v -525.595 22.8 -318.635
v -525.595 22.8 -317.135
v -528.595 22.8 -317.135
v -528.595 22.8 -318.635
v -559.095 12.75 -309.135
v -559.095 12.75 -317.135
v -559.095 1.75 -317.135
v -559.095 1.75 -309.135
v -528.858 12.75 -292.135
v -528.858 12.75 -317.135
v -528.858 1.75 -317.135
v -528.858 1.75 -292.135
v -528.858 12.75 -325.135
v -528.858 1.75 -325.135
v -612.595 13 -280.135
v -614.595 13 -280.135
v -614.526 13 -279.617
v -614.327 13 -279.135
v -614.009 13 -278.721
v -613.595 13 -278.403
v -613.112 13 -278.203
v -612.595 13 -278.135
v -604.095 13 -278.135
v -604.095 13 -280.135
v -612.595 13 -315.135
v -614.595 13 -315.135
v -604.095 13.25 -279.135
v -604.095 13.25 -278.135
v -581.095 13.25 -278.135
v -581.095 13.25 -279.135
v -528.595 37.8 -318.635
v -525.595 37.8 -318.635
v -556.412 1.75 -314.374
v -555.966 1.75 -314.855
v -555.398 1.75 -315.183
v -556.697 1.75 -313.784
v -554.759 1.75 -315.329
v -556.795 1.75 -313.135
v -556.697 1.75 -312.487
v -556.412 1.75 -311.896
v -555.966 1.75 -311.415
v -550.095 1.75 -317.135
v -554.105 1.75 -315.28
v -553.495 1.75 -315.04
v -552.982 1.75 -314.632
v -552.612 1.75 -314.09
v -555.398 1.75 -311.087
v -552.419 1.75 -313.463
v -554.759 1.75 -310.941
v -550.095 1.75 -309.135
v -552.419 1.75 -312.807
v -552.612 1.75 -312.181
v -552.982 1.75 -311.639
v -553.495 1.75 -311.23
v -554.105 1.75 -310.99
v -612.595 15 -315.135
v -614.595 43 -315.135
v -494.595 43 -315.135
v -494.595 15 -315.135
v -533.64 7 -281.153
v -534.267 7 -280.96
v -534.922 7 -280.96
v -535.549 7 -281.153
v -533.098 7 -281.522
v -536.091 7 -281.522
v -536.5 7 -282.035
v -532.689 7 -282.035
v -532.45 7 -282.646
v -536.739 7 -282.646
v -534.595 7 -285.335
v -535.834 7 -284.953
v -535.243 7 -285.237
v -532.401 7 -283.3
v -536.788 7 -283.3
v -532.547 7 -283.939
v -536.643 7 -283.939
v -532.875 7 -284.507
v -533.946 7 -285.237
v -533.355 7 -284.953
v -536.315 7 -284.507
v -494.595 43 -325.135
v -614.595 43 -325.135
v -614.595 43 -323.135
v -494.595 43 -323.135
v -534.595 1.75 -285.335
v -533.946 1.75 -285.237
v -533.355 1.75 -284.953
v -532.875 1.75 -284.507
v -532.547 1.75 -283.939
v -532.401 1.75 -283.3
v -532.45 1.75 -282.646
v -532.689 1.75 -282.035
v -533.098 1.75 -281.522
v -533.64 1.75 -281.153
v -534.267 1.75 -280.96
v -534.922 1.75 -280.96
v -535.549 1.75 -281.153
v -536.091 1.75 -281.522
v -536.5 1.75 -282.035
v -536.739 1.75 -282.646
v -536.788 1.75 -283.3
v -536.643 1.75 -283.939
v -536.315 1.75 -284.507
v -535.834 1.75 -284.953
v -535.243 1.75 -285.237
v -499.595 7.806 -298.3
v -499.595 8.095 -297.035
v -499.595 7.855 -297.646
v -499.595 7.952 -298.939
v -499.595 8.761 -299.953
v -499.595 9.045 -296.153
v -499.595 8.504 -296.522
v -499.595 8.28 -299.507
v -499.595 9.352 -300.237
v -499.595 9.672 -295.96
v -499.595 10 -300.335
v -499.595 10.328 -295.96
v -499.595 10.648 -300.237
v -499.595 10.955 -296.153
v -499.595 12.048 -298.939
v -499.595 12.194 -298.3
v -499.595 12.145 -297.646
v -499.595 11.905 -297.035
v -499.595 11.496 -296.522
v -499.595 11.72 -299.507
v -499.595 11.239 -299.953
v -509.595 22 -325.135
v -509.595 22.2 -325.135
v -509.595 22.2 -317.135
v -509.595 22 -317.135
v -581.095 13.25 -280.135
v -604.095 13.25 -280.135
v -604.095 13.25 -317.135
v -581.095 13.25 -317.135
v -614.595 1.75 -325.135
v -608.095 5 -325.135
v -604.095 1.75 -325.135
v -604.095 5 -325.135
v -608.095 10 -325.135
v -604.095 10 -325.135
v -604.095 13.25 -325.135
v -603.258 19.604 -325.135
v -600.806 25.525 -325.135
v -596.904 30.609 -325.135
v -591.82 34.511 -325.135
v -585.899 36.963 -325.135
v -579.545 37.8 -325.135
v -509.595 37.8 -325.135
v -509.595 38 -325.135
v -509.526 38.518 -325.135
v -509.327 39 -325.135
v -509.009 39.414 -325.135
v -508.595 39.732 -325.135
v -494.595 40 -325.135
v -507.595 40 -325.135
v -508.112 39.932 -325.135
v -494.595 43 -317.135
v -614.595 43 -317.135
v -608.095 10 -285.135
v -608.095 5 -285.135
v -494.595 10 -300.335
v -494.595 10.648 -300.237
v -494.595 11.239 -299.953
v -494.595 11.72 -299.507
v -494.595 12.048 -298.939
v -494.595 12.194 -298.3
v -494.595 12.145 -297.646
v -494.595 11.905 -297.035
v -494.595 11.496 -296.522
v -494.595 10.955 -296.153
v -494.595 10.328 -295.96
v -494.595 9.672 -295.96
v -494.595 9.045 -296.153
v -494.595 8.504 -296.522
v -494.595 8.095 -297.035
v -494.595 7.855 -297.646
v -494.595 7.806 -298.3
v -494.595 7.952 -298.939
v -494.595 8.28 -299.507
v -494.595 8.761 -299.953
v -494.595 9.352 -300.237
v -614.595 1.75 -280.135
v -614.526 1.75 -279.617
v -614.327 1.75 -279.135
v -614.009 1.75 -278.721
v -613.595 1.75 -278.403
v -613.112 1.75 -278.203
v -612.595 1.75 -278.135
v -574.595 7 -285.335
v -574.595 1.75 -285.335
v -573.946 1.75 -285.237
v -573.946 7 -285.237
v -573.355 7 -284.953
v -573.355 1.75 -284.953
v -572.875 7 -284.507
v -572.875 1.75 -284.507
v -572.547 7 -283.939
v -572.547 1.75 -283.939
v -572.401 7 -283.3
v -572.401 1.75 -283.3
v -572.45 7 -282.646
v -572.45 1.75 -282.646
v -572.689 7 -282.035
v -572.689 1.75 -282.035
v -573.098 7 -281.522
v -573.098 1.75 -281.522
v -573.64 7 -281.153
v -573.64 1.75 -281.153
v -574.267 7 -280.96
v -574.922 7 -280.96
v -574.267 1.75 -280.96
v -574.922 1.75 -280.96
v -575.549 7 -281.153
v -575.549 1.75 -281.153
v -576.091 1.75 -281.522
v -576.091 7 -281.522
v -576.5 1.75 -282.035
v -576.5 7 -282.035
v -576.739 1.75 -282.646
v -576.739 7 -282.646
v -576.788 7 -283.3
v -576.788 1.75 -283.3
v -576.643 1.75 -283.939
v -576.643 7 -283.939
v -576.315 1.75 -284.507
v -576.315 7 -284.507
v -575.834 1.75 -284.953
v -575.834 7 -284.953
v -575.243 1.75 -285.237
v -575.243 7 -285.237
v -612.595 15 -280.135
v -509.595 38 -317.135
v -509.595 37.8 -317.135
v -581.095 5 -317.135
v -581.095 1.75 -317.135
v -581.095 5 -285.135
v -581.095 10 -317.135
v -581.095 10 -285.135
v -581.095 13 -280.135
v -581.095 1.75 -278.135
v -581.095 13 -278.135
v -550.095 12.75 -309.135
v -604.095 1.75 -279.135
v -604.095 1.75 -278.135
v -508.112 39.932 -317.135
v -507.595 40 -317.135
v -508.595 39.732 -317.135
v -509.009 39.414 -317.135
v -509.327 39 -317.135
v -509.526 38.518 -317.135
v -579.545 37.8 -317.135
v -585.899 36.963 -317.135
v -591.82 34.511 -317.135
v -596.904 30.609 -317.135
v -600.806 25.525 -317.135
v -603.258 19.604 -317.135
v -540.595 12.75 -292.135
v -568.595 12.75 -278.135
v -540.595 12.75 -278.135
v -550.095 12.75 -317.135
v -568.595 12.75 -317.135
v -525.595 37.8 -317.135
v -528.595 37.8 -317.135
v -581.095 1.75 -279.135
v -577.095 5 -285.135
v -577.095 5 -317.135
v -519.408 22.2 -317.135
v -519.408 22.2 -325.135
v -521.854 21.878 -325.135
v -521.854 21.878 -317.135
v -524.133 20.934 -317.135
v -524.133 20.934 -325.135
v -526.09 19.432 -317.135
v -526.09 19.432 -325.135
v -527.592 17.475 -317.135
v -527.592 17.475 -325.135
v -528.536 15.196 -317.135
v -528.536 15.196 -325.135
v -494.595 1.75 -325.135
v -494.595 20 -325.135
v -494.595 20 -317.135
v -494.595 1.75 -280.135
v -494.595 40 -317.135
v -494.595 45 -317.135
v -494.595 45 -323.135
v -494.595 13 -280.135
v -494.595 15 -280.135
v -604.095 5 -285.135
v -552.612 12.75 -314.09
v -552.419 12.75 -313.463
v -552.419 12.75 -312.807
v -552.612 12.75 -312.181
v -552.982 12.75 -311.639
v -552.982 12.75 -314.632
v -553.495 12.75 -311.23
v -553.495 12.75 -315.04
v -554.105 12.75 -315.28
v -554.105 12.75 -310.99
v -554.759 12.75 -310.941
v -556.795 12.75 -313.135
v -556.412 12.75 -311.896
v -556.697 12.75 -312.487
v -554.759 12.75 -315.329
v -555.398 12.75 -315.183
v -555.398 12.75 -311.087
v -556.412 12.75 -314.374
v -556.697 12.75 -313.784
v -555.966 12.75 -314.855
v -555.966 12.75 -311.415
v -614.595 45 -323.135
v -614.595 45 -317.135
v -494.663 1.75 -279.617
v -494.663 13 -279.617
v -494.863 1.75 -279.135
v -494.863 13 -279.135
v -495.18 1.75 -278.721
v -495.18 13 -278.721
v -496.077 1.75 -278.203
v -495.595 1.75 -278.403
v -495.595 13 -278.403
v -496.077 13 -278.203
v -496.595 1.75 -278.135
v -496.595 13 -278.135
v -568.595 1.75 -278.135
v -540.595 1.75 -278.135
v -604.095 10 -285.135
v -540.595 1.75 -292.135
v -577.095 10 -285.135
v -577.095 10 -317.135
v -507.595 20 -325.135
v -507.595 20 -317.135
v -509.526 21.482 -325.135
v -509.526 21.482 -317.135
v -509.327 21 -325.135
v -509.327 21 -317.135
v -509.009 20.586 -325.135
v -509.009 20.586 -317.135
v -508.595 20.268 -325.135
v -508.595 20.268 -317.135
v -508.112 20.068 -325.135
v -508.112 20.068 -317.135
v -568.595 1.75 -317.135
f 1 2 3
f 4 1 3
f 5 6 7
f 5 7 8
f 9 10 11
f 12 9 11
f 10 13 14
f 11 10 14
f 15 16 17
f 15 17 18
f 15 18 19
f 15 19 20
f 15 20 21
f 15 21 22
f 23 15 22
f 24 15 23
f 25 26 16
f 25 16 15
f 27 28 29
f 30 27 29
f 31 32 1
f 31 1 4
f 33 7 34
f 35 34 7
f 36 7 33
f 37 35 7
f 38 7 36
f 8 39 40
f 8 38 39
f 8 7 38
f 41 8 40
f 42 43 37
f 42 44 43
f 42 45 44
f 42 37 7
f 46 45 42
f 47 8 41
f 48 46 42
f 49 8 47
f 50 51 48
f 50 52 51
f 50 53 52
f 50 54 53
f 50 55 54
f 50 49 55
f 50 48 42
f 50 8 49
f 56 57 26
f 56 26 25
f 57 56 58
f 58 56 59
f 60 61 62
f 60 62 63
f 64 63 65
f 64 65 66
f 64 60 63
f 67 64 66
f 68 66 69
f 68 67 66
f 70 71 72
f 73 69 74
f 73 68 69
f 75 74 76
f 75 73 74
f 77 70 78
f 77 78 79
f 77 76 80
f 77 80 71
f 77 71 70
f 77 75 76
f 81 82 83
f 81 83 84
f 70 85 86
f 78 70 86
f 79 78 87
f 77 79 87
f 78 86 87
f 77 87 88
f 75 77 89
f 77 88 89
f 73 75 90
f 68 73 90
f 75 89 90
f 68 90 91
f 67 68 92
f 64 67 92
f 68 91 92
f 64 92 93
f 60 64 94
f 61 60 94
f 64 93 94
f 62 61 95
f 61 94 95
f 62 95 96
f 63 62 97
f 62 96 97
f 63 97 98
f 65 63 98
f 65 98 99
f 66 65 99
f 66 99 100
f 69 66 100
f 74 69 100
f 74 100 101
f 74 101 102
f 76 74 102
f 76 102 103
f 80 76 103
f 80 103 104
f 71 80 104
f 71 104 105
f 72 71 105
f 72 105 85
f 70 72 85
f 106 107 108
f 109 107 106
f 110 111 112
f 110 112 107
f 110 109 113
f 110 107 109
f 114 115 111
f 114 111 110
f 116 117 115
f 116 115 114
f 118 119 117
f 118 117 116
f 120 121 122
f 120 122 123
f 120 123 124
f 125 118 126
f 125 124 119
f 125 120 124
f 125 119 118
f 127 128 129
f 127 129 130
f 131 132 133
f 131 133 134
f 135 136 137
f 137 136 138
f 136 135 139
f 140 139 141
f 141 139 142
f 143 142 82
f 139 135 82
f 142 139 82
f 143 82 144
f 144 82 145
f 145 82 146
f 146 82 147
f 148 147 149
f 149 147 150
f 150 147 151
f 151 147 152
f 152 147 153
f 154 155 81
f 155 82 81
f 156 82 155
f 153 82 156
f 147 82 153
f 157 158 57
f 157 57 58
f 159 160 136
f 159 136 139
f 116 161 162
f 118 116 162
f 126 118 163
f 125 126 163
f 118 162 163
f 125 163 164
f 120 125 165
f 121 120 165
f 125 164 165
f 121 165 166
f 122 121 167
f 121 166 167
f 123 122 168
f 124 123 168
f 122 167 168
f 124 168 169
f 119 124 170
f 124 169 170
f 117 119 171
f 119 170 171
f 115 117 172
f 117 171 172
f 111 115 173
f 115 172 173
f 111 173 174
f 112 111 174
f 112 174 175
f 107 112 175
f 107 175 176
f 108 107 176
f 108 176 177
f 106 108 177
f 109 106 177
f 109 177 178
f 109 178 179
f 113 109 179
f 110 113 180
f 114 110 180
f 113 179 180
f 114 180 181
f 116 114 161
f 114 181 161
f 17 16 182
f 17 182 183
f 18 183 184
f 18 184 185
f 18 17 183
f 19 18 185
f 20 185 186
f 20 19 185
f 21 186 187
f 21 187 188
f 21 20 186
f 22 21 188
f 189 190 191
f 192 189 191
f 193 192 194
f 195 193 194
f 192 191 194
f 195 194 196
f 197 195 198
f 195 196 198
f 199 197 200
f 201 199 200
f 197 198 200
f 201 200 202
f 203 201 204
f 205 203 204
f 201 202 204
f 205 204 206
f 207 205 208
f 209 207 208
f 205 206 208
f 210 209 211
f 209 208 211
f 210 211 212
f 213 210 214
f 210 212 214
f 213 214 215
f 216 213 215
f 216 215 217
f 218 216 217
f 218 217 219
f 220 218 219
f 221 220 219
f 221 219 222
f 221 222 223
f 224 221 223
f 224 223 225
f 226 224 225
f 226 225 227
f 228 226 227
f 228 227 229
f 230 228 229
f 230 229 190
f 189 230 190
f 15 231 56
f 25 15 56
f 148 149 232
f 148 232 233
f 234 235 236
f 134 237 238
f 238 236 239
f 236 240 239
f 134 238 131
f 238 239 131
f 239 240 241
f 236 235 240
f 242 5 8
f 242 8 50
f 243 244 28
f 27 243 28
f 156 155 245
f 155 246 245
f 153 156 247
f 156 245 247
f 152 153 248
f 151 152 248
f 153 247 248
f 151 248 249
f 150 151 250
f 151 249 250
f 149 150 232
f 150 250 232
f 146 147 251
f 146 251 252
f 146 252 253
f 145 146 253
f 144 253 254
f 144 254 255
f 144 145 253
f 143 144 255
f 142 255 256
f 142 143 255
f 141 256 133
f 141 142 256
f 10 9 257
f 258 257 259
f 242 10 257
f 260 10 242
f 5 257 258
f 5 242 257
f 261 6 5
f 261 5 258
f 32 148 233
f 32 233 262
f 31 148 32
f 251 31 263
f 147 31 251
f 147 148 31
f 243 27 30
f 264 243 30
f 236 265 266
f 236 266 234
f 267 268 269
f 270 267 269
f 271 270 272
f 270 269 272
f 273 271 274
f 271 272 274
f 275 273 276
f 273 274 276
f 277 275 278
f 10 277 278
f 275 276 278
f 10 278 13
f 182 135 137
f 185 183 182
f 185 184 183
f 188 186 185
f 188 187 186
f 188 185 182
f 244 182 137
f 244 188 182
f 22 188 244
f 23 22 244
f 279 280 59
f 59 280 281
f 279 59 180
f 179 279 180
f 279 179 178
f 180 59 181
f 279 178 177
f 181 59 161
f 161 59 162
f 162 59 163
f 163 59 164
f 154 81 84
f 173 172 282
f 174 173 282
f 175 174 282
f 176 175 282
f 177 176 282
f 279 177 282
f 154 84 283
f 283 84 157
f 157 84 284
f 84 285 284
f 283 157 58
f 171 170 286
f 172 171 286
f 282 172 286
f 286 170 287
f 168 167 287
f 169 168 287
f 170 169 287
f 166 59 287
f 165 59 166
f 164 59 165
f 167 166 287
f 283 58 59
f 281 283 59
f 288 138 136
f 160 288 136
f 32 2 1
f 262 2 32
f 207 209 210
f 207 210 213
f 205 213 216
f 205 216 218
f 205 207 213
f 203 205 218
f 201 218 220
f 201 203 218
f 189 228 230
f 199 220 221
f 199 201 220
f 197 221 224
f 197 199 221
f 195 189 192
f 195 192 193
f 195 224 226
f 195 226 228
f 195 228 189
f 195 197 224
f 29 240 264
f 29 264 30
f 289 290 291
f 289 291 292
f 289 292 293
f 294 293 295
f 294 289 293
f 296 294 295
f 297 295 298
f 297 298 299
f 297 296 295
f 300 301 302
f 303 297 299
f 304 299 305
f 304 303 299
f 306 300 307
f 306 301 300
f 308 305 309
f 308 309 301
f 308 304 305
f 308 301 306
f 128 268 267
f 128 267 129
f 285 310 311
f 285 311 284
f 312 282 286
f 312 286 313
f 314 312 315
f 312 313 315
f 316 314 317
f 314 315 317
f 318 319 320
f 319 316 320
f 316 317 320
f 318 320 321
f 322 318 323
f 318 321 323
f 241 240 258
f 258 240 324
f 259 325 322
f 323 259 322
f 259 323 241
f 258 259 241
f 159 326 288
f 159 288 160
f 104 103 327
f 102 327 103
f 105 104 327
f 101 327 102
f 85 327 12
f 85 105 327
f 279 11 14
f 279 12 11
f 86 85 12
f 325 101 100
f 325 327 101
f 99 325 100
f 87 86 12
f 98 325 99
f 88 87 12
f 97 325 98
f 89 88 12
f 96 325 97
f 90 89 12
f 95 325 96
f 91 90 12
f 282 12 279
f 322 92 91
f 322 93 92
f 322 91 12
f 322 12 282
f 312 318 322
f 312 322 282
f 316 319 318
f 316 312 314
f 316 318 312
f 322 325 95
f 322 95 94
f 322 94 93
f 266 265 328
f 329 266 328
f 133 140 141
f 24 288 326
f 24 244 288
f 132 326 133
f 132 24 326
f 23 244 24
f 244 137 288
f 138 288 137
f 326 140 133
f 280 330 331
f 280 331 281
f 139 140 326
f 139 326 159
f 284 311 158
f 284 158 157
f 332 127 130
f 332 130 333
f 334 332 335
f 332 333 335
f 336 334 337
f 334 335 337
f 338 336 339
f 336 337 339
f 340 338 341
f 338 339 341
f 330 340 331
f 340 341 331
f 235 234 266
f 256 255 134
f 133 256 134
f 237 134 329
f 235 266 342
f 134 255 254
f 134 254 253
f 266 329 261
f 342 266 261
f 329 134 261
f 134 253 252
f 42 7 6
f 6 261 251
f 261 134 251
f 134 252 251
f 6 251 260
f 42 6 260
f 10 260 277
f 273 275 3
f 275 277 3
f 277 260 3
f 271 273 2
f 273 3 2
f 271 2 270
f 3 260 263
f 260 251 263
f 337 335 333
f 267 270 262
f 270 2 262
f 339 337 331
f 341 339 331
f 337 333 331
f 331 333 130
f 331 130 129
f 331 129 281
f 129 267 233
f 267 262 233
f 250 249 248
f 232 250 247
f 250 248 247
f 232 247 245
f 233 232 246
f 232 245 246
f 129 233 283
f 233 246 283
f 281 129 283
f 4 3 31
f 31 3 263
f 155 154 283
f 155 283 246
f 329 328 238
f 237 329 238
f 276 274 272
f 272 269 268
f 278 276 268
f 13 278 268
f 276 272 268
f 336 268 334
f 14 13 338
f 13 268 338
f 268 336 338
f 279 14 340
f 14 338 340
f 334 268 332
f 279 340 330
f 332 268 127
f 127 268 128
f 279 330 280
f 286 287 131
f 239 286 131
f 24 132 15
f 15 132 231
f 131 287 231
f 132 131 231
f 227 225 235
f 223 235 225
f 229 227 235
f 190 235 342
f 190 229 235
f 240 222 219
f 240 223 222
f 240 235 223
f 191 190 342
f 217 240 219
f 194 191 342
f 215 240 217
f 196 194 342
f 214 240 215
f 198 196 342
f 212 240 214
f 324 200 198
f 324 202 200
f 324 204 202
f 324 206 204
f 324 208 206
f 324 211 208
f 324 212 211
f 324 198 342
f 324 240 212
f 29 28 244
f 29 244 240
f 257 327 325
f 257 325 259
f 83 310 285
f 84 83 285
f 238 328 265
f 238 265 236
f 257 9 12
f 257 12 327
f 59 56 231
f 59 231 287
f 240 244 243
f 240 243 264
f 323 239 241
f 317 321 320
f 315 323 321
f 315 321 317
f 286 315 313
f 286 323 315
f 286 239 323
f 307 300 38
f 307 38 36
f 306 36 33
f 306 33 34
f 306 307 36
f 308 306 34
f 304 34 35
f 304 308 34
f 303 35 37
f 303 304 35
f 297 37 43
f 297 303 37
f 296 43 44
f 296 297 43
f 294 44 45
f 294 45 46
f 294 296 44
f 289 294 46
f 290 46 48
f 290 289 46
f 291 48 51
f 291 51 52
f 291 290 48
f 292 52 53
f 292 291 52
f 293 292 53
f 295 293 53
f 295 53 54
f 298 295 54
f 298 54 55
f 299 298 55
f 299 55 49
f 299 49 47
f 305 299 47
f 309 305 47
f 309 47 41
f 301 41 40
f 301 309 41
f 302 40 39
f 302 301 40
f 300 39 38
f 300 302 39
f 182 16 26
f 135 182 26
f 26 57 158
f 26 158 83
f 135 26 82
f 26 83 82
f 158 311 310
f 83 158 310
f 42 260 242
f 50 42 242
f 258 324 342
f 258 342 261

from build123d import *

# Parameters (mm, degrees)
SKETCH_1_W           = 120
SKETCH_1_H           = 47
EXTRUDE_1_DEPTH      = 15
SKETCH_2_W           = 120
SKETCH_2_H           = 10
EXTRUDE_2_DEPTH      = 30
SKETCH_3_W           = 28
SKETCH_3_H           = 10.5
CUT_EXTRUDE_1_DEPTH  = 619.029542744
SKETCH_4_W           = 23
SKETCH_4_H           = 11.5
CUT_EXTRUDE_2_DEPTH  = 619.029542744
SKETCH_5_W           = 23
SKETCH_5_H           = 11.5
EXTRUDE_3_DEPTH      = 1
CUT_EXTRUDE_4_DEPTH  = 8
SKETCH_8_W           = 4
SKETCH_8_H           = 5
CUT_EXTRUDE_5_DEPTH  = 40
EXTRUDE_5_DEPTH      = 3
FILLET_2_R           = 2
EXTRUDE_6_DEPTH      = 2
SKETCH_12_W          = 120
SKETCH_12_H          = 2
CUT_EXTRUDE_7_DEPTH  = 2
SKETCH_15_R          = 2.2
CUT_EXTRUDE_9_DEPTH  = 7
SKETCH_18_W          = 63.5
SKETCH_18_H          = 11
CUT_EXTRUDE_15_DEPTH = 8
SKETCH_20_W          = 28
SKETCH_20_H          = 0.5
CUT_EXTRUDE_16_DEPTH = 80
CUT_EXTRUDE_17_DEPTH = 8
SKETCH_22_W          = 11.736843269
SKETCH_22_H          = 11
CUT_EXTRUDE_18_DEPTH = 25
SKETCH_24_W          = 120
SKETCH_24_H          = 4
CUT_EXTRUDE_19_DEPTH = 2
SKETCH_25_W          = 23.28525444
SKETCH_25_H          = 36.187442056
CUT_EXTRUDE_20_DEPTH = 2
SKETCH_27_W          = 120.611710339
SKETCH_27_H          = 50.488927659
CUT_EXTRUDE_24_DEPTH = 1.75
SKETCH_28_W          = 3
SKETCH_28_H          = 15
EXTRUDE_7_DEPTH      = 1.5
CUT_EXTRUDE_25_DEPTH = 2
SKETCH_30_W          = 9
SKETCH_30_H          = 8
SKETCH_30_R          = 2.2
EXTRUDE_8_DEPTH      = 11
SKETCH_33_R          = 2.2
CUT_EXTRUDE_27_DEPTH = 5


with BuildPart() as part:
    # 草图1 → 凸台-拉伸1 (new body)
    with BuildSketch(Plane(origin=(0, 0, 0), x_dir=(1, 0, 0), z_dir=(0, 1, 0))):
        with Locations((-554.594594595, 301.635135135)):
            Rectangle(SKETCH_1_W, SKETCH_1_H)
    extrude(amount=EXTRUDE_1_DEPTH)

    # 草图2 → 凸台-拉伸2 (add)
    with BuildSketch(Plane(origin=(0, 15, 0), x_dir=(1, 0, 0), z_dir=(0, 1, 0))):
        with Locations((-554.594594595, 320.135135135)):
            Rectangle(SKETCH_2_W, SKETCH_2_H)
    extrude(amount=EXTRUDE_2_DEPTH)

    # 草图3 → 切除-拉伸1 (cut, through all)
    with BuildSketch(Plane.XY.offset(-278.135135135)):
        with Locations((-554.594594595, 7.5)):
            Rectangle(SKETCH_3_W, SKETCH_3_H)
    extrude(amount=-CUT_EXTRUDE_1_DEPTH, mode=Mode.SUBTRACT)

    # 草图4 → 切除-拉伸2 (cut, through all)
    with BuildSketch(Plane.XY.offset(-278.135135135)):
        with Locations((-592.594594595, 7.5)):
            Rectangle(SKETCH_4_W, SKETCH_4_H)
    extrude(amount=-CUT_EXTRUDE_2_DEPTH, mode=Mode.SUBTRACT)

    # 草图7 → 切除-拉伸4 (cut)
    with BuildSketch(Plane(origin=(0, 0, -325.135135135), x_dir=(-1, 0, 0), z_dir=(0, 0, -1))):
        with BuildLine():
            Line((494.594594595, 40), (509.594594595, 40))
            Line((509.594594595, 40), (509.594594595, 37.8))
            Line((509.594594595, 37.8), (579.544594595, 37.8))
            ThreePointArc((579.544594595, 37.8), (596.904066073, 30.609471478), (604.094594595, 13.25))
            Line((604.094594595, 13.25), (604.094594595, 12.75))
            Line((604.094594595, 12.75), (540.594594595, 12.75))
            ThreePointArc((540.594594595, 12.75), (537.826753677, 19.432159082), (531.144594595, 22.2))
            Line((531.144594595, 22.2), (509.594594595, 22.2))
            Line((509.594594595, 22.2), (509.594594595, 20))
            Line((509.594594595, 20), (494.594594595, 20))
            Line((494.594594595, 20), (494.594594595, 40))
        make_face()
    extrude(amount=-CUT_EXTRUDE_4_DEPTH, mode=Mode.SUBTRACT)

    # 草图8 → 切除-拉伸5 (cut)
    with BuildSketch(Plane(origin=(0, 0, -325.135135135), x_dir=(-1, 0, 0), z_dir=(0, 0, -1))):
        with Locations((606.094594595, 7.5)):
            Rectangle(SKETCH_8_W, SKETCH_8_H)
        with Locations((579.094594595, 7.5)):
            Rectangle(SKETCH_8_W, SKETCH_8_H)
    extrude(amount=-CUT_EXTRUDE_5_DEPTH, mode=Mode.SUBTRACT)

    # 草图9 → 凸台-拉伸5 (add)
    with BuildSketch(Plane(origin=(0, 0, -325.135135135), x_dir=(-1, 0, 0), z_dir=(0, 0, -1))):
        Polygon((540.594594595, 2.25), (546.794594595, 2.25), (546.794594595, 10.25), (562.394594595, 10.25), (562.394594595, 2.25), (568.594594595, 2.25), (568.594594595, 10.25), (568.594594595, 12.75), (540.594594595, 12.75), (540.594594595, 10.25), align=None)
    extrude(amount=-EXTRUDE_5_DEPTH)

    # 圆角2
    fillet_2_edges = [part.edges().sort_by_distance(p)[0] for p in [
        (-509.594594595, 40, -321.135135135),
        (-509.594594595, 20, -321.135135135),
        (-494.594594595, 7.5, -278.135135135),
        (-614.594594595, 7.5, -278.135135135),
    ]]
    fillet(fillet_2_edges, radius=FILLET_2_R)

    # 草图10 → 凸台-拉伸6 (add)
    with BuildSketch(Plane.XZ):
        Polygon((-494.594594595, -325.135135135), (-494.594594595, -321.135135135), (-544.594594595, -321.135135135), (-544.594594595, -288.135135135), (-564.594594595, -288.135135135), (-564.594594595, -321.135135135), (-614.594594595, -321.135135135), (-614.594594595, -325.135135135), align=None)
    extrude(amount=EXTRUDE_6_DEPTH)

    # 草图12 → 切除-拉伸7 (cut)
    with BuildSketch(Plane(origin=(0, 45, 0), x_dir=(1, 0, 0), z_dir=(0, 1, 0))):
        with Locations((-554.594594595, 324.135135135)):
            Rectangle(SKETCH_12_W, SKETCH_12_H)
        with Locations((-554.594594595, 316.135135135)):
            Rectangle(SKETCH_12_W, SKETCH_12_H)
    extrude(amount=-CUT_EXTRUDE_7_DEPTH, mode=Mode.SUBTRACT)

    # 草图15 → 切除-拉伸9 (cut)
    with BuildSketch(Plane.XZ):
        with Locations(Location((-574.594594595, -283.135135135, 0), (0, 0, 270))):
            Circle(SKETCH_15_R)
        with Locations(Location((-534.594594595, -283.135135135, 0), (0, 0, 270))):
            Circle(SKETCH_15_R)
    extrude(amount=-CUT_EXTRUDE_9_DEPTH, mode=Mode.SUBTRACT)

    # 草图18 → 切除-拉伸15 (cut)
    with BuildSketch(Plane(origin=(0, 0, -325.135135135), x_dir=(-1, 0, 0), z_dir=(0, 0, -1))):
        with Locations((572.344594595, 7.25)):
            Rectangle(SKETCH_18_W, SKETCH_18_H)
    extrude(amount=-CUT_EXTRUDE_15_DEPTH, mode=Mode.SUBTRACT)

    # 草图20 → 切除-拉伸16 (cut)
    with BuildSketch(Plane(origin=(0, 0, -317.135135135), x_dir=(-1, 0, 0), z_dir=(0, 0, -1))):
        with Locations((554.594594595, 2)):
            Rectangle(SKETCH_20_W, SKETCH_20_H)
    extrude(amount=-CUT_EXTRUDE_16_DEPTH, mode=Mode.SUBTRACT)

    # 草图21 → 切除-拉伸17 (cut)
    with BuildSketch(Plane(origin=(0, 0, -325.135135135), x_dir=(-1, 0, 0), z_dir=(0, 0, -1))):
        with BuildLine():
            Line((528.857751326, 12.75), (528.857751326, 1.75))
            Line((528.857751326, 1.75), (540.594594595, 1.75))
            Line((540.594594595, 1.75), (540.594594595, 12.75))
            ThreePointArc((540.594594595, 12.75), (537.826753677, 19.432159082), (531.144594595, 22.2))
            Line((531.144594595, 22.2), (519.407751326, 22.2))
            ThreePointArc((519.407751326, 22.2), (526.089910408, 19.432159082), (528.857751326, 12.75))
        make_face()
    extrude(amount=-CUT_EXTRUDE_17_DEPTH, mode=Mode.SUBTRACT)

    # 草图22 → 切除-拉伸18 (cut)
    with BuildSketch(Plane(origin=(0, 0, -317.135135135), x_dir=(-1, 0, 0), z_dir=(0, 0, -1))):
        with Locations((534.72617296, 7.25)):
            Rectangle(SKETCH_22_W, SKETCH_22_H)
    extrude(amount=-CUT_EXTRUDE_18_DEPTH, mode=Mode.SUBTRACT)

    # 草图24 → 切除-拉伸19 (cut)
    with BuildSketch(Plane.XZ.offset(2)):
        with Locations((-554.594594595, -323.135135135)):
            Rectangle(SKETCH_24_W, SKETCH_24_H)
    extrude(amount=-CUT_EXTRUDE_19_DEPTH, mode=Mode.SUBTRACT)

    # 草图25 → 切除-拉伸20 (cut)
    with BuildSketch(Plane.XZ.offset(2)):
        with Locations((-554.882611991, -305.107968522)):
            Rectangle(SKETCH_25_W, SKETCH_25_H)
    extrude(amount=-CUT_EXTRUDE_20_DEPTH, mode=Mode.SUBTRACT)

    # 草图27 → 切除-拉伸24 (cut)
    with BuildSketch(Plane.XZ):
        with Locations((-554.288739426, -299.890671306)):
            Rectangle(SKETCH_27_W, SKETCH_27_H)
    extrude(amount=-CUT_EXTRUDE_24_DEPTH, mode=Mode.SUBTRACT)

    # 草图28 → 凸台-拉伸7 (add)
    with BuildSketch(Plane(origin=(0, 0, -317.135135135), x_dir=(-1, 0, 0), z_dir=(0, 0, -1))):
        with Locations((527.094594595, 30.3)):
            Rectangle(SKETCH_28_W, SKETCH_28_H)
    extrude(amount=EXTRUDE_7_DEPTH)

    # 草图29 → 切除-拉伸25 (cut)
    with BuildSketch(Plane(origin=(0, 15, 0), x_dir=(1, 0, 0), z_dir=(0, 1, 0))):
        Polygon((-494.594594595, 280.135135135), (-612.594594595, 280.135135135), (-612.594594595, 315.135135135), (-614.594594595, 315.135135135), (-614.594594595, 280.135135135), (-614.594594595, 278.135135135), (-494.594594595, 278.135135135), align=None)
    extrude(amount=-CUT_EXTRUDE_25_DEPTH, mode=Mode.SUBTRACT)

    # 草图30 → 凸台-拉伸8 (add)
    with BuildSketch(Plane.XZ.offset(-12.75)):
        with Locations((-554.594594595, -313.135135135)):
            Rectangle(SKETCH_30_W, SKETCH_30_H)
        with Locations(Location((-554.594594595, -313.135135135, 0), (0, 0, 180))):
            Circle(SKETCH_30_R, mode=Mode.SUBTRACT)
    extrude(amount=EXTRUDE_8_DEPTH)

    # 草图33 → 切除-拉伸27 (cut)
    with BuildSketch(Plane(origin=(-494.594594595, 0, 0), x_dir=(0, 0, -1), z_dir=(1, 0, 0))):
        with Locations((298.135135135, 10)):
            Circle(SKETCH_33_R)
    extrude(amount=-CUT_EXTRUDE_27_DEPTH, mode=Mode.SUBTRACT)


with BuildPart() as body_2:
    # 草图5 → 凸台-拉伸3 (new body)
    with BuildSketch(Plane.XY.offset(-278.135135135)):
        with Locations((-592.594594595, 7.5)):
            Rectangle(SKETCH_5_W, SKETCH_5_H)
    extrude(amount=-EXTRUDE_3_DEPTH)


solid = Compound([part.part, body_2.part])
